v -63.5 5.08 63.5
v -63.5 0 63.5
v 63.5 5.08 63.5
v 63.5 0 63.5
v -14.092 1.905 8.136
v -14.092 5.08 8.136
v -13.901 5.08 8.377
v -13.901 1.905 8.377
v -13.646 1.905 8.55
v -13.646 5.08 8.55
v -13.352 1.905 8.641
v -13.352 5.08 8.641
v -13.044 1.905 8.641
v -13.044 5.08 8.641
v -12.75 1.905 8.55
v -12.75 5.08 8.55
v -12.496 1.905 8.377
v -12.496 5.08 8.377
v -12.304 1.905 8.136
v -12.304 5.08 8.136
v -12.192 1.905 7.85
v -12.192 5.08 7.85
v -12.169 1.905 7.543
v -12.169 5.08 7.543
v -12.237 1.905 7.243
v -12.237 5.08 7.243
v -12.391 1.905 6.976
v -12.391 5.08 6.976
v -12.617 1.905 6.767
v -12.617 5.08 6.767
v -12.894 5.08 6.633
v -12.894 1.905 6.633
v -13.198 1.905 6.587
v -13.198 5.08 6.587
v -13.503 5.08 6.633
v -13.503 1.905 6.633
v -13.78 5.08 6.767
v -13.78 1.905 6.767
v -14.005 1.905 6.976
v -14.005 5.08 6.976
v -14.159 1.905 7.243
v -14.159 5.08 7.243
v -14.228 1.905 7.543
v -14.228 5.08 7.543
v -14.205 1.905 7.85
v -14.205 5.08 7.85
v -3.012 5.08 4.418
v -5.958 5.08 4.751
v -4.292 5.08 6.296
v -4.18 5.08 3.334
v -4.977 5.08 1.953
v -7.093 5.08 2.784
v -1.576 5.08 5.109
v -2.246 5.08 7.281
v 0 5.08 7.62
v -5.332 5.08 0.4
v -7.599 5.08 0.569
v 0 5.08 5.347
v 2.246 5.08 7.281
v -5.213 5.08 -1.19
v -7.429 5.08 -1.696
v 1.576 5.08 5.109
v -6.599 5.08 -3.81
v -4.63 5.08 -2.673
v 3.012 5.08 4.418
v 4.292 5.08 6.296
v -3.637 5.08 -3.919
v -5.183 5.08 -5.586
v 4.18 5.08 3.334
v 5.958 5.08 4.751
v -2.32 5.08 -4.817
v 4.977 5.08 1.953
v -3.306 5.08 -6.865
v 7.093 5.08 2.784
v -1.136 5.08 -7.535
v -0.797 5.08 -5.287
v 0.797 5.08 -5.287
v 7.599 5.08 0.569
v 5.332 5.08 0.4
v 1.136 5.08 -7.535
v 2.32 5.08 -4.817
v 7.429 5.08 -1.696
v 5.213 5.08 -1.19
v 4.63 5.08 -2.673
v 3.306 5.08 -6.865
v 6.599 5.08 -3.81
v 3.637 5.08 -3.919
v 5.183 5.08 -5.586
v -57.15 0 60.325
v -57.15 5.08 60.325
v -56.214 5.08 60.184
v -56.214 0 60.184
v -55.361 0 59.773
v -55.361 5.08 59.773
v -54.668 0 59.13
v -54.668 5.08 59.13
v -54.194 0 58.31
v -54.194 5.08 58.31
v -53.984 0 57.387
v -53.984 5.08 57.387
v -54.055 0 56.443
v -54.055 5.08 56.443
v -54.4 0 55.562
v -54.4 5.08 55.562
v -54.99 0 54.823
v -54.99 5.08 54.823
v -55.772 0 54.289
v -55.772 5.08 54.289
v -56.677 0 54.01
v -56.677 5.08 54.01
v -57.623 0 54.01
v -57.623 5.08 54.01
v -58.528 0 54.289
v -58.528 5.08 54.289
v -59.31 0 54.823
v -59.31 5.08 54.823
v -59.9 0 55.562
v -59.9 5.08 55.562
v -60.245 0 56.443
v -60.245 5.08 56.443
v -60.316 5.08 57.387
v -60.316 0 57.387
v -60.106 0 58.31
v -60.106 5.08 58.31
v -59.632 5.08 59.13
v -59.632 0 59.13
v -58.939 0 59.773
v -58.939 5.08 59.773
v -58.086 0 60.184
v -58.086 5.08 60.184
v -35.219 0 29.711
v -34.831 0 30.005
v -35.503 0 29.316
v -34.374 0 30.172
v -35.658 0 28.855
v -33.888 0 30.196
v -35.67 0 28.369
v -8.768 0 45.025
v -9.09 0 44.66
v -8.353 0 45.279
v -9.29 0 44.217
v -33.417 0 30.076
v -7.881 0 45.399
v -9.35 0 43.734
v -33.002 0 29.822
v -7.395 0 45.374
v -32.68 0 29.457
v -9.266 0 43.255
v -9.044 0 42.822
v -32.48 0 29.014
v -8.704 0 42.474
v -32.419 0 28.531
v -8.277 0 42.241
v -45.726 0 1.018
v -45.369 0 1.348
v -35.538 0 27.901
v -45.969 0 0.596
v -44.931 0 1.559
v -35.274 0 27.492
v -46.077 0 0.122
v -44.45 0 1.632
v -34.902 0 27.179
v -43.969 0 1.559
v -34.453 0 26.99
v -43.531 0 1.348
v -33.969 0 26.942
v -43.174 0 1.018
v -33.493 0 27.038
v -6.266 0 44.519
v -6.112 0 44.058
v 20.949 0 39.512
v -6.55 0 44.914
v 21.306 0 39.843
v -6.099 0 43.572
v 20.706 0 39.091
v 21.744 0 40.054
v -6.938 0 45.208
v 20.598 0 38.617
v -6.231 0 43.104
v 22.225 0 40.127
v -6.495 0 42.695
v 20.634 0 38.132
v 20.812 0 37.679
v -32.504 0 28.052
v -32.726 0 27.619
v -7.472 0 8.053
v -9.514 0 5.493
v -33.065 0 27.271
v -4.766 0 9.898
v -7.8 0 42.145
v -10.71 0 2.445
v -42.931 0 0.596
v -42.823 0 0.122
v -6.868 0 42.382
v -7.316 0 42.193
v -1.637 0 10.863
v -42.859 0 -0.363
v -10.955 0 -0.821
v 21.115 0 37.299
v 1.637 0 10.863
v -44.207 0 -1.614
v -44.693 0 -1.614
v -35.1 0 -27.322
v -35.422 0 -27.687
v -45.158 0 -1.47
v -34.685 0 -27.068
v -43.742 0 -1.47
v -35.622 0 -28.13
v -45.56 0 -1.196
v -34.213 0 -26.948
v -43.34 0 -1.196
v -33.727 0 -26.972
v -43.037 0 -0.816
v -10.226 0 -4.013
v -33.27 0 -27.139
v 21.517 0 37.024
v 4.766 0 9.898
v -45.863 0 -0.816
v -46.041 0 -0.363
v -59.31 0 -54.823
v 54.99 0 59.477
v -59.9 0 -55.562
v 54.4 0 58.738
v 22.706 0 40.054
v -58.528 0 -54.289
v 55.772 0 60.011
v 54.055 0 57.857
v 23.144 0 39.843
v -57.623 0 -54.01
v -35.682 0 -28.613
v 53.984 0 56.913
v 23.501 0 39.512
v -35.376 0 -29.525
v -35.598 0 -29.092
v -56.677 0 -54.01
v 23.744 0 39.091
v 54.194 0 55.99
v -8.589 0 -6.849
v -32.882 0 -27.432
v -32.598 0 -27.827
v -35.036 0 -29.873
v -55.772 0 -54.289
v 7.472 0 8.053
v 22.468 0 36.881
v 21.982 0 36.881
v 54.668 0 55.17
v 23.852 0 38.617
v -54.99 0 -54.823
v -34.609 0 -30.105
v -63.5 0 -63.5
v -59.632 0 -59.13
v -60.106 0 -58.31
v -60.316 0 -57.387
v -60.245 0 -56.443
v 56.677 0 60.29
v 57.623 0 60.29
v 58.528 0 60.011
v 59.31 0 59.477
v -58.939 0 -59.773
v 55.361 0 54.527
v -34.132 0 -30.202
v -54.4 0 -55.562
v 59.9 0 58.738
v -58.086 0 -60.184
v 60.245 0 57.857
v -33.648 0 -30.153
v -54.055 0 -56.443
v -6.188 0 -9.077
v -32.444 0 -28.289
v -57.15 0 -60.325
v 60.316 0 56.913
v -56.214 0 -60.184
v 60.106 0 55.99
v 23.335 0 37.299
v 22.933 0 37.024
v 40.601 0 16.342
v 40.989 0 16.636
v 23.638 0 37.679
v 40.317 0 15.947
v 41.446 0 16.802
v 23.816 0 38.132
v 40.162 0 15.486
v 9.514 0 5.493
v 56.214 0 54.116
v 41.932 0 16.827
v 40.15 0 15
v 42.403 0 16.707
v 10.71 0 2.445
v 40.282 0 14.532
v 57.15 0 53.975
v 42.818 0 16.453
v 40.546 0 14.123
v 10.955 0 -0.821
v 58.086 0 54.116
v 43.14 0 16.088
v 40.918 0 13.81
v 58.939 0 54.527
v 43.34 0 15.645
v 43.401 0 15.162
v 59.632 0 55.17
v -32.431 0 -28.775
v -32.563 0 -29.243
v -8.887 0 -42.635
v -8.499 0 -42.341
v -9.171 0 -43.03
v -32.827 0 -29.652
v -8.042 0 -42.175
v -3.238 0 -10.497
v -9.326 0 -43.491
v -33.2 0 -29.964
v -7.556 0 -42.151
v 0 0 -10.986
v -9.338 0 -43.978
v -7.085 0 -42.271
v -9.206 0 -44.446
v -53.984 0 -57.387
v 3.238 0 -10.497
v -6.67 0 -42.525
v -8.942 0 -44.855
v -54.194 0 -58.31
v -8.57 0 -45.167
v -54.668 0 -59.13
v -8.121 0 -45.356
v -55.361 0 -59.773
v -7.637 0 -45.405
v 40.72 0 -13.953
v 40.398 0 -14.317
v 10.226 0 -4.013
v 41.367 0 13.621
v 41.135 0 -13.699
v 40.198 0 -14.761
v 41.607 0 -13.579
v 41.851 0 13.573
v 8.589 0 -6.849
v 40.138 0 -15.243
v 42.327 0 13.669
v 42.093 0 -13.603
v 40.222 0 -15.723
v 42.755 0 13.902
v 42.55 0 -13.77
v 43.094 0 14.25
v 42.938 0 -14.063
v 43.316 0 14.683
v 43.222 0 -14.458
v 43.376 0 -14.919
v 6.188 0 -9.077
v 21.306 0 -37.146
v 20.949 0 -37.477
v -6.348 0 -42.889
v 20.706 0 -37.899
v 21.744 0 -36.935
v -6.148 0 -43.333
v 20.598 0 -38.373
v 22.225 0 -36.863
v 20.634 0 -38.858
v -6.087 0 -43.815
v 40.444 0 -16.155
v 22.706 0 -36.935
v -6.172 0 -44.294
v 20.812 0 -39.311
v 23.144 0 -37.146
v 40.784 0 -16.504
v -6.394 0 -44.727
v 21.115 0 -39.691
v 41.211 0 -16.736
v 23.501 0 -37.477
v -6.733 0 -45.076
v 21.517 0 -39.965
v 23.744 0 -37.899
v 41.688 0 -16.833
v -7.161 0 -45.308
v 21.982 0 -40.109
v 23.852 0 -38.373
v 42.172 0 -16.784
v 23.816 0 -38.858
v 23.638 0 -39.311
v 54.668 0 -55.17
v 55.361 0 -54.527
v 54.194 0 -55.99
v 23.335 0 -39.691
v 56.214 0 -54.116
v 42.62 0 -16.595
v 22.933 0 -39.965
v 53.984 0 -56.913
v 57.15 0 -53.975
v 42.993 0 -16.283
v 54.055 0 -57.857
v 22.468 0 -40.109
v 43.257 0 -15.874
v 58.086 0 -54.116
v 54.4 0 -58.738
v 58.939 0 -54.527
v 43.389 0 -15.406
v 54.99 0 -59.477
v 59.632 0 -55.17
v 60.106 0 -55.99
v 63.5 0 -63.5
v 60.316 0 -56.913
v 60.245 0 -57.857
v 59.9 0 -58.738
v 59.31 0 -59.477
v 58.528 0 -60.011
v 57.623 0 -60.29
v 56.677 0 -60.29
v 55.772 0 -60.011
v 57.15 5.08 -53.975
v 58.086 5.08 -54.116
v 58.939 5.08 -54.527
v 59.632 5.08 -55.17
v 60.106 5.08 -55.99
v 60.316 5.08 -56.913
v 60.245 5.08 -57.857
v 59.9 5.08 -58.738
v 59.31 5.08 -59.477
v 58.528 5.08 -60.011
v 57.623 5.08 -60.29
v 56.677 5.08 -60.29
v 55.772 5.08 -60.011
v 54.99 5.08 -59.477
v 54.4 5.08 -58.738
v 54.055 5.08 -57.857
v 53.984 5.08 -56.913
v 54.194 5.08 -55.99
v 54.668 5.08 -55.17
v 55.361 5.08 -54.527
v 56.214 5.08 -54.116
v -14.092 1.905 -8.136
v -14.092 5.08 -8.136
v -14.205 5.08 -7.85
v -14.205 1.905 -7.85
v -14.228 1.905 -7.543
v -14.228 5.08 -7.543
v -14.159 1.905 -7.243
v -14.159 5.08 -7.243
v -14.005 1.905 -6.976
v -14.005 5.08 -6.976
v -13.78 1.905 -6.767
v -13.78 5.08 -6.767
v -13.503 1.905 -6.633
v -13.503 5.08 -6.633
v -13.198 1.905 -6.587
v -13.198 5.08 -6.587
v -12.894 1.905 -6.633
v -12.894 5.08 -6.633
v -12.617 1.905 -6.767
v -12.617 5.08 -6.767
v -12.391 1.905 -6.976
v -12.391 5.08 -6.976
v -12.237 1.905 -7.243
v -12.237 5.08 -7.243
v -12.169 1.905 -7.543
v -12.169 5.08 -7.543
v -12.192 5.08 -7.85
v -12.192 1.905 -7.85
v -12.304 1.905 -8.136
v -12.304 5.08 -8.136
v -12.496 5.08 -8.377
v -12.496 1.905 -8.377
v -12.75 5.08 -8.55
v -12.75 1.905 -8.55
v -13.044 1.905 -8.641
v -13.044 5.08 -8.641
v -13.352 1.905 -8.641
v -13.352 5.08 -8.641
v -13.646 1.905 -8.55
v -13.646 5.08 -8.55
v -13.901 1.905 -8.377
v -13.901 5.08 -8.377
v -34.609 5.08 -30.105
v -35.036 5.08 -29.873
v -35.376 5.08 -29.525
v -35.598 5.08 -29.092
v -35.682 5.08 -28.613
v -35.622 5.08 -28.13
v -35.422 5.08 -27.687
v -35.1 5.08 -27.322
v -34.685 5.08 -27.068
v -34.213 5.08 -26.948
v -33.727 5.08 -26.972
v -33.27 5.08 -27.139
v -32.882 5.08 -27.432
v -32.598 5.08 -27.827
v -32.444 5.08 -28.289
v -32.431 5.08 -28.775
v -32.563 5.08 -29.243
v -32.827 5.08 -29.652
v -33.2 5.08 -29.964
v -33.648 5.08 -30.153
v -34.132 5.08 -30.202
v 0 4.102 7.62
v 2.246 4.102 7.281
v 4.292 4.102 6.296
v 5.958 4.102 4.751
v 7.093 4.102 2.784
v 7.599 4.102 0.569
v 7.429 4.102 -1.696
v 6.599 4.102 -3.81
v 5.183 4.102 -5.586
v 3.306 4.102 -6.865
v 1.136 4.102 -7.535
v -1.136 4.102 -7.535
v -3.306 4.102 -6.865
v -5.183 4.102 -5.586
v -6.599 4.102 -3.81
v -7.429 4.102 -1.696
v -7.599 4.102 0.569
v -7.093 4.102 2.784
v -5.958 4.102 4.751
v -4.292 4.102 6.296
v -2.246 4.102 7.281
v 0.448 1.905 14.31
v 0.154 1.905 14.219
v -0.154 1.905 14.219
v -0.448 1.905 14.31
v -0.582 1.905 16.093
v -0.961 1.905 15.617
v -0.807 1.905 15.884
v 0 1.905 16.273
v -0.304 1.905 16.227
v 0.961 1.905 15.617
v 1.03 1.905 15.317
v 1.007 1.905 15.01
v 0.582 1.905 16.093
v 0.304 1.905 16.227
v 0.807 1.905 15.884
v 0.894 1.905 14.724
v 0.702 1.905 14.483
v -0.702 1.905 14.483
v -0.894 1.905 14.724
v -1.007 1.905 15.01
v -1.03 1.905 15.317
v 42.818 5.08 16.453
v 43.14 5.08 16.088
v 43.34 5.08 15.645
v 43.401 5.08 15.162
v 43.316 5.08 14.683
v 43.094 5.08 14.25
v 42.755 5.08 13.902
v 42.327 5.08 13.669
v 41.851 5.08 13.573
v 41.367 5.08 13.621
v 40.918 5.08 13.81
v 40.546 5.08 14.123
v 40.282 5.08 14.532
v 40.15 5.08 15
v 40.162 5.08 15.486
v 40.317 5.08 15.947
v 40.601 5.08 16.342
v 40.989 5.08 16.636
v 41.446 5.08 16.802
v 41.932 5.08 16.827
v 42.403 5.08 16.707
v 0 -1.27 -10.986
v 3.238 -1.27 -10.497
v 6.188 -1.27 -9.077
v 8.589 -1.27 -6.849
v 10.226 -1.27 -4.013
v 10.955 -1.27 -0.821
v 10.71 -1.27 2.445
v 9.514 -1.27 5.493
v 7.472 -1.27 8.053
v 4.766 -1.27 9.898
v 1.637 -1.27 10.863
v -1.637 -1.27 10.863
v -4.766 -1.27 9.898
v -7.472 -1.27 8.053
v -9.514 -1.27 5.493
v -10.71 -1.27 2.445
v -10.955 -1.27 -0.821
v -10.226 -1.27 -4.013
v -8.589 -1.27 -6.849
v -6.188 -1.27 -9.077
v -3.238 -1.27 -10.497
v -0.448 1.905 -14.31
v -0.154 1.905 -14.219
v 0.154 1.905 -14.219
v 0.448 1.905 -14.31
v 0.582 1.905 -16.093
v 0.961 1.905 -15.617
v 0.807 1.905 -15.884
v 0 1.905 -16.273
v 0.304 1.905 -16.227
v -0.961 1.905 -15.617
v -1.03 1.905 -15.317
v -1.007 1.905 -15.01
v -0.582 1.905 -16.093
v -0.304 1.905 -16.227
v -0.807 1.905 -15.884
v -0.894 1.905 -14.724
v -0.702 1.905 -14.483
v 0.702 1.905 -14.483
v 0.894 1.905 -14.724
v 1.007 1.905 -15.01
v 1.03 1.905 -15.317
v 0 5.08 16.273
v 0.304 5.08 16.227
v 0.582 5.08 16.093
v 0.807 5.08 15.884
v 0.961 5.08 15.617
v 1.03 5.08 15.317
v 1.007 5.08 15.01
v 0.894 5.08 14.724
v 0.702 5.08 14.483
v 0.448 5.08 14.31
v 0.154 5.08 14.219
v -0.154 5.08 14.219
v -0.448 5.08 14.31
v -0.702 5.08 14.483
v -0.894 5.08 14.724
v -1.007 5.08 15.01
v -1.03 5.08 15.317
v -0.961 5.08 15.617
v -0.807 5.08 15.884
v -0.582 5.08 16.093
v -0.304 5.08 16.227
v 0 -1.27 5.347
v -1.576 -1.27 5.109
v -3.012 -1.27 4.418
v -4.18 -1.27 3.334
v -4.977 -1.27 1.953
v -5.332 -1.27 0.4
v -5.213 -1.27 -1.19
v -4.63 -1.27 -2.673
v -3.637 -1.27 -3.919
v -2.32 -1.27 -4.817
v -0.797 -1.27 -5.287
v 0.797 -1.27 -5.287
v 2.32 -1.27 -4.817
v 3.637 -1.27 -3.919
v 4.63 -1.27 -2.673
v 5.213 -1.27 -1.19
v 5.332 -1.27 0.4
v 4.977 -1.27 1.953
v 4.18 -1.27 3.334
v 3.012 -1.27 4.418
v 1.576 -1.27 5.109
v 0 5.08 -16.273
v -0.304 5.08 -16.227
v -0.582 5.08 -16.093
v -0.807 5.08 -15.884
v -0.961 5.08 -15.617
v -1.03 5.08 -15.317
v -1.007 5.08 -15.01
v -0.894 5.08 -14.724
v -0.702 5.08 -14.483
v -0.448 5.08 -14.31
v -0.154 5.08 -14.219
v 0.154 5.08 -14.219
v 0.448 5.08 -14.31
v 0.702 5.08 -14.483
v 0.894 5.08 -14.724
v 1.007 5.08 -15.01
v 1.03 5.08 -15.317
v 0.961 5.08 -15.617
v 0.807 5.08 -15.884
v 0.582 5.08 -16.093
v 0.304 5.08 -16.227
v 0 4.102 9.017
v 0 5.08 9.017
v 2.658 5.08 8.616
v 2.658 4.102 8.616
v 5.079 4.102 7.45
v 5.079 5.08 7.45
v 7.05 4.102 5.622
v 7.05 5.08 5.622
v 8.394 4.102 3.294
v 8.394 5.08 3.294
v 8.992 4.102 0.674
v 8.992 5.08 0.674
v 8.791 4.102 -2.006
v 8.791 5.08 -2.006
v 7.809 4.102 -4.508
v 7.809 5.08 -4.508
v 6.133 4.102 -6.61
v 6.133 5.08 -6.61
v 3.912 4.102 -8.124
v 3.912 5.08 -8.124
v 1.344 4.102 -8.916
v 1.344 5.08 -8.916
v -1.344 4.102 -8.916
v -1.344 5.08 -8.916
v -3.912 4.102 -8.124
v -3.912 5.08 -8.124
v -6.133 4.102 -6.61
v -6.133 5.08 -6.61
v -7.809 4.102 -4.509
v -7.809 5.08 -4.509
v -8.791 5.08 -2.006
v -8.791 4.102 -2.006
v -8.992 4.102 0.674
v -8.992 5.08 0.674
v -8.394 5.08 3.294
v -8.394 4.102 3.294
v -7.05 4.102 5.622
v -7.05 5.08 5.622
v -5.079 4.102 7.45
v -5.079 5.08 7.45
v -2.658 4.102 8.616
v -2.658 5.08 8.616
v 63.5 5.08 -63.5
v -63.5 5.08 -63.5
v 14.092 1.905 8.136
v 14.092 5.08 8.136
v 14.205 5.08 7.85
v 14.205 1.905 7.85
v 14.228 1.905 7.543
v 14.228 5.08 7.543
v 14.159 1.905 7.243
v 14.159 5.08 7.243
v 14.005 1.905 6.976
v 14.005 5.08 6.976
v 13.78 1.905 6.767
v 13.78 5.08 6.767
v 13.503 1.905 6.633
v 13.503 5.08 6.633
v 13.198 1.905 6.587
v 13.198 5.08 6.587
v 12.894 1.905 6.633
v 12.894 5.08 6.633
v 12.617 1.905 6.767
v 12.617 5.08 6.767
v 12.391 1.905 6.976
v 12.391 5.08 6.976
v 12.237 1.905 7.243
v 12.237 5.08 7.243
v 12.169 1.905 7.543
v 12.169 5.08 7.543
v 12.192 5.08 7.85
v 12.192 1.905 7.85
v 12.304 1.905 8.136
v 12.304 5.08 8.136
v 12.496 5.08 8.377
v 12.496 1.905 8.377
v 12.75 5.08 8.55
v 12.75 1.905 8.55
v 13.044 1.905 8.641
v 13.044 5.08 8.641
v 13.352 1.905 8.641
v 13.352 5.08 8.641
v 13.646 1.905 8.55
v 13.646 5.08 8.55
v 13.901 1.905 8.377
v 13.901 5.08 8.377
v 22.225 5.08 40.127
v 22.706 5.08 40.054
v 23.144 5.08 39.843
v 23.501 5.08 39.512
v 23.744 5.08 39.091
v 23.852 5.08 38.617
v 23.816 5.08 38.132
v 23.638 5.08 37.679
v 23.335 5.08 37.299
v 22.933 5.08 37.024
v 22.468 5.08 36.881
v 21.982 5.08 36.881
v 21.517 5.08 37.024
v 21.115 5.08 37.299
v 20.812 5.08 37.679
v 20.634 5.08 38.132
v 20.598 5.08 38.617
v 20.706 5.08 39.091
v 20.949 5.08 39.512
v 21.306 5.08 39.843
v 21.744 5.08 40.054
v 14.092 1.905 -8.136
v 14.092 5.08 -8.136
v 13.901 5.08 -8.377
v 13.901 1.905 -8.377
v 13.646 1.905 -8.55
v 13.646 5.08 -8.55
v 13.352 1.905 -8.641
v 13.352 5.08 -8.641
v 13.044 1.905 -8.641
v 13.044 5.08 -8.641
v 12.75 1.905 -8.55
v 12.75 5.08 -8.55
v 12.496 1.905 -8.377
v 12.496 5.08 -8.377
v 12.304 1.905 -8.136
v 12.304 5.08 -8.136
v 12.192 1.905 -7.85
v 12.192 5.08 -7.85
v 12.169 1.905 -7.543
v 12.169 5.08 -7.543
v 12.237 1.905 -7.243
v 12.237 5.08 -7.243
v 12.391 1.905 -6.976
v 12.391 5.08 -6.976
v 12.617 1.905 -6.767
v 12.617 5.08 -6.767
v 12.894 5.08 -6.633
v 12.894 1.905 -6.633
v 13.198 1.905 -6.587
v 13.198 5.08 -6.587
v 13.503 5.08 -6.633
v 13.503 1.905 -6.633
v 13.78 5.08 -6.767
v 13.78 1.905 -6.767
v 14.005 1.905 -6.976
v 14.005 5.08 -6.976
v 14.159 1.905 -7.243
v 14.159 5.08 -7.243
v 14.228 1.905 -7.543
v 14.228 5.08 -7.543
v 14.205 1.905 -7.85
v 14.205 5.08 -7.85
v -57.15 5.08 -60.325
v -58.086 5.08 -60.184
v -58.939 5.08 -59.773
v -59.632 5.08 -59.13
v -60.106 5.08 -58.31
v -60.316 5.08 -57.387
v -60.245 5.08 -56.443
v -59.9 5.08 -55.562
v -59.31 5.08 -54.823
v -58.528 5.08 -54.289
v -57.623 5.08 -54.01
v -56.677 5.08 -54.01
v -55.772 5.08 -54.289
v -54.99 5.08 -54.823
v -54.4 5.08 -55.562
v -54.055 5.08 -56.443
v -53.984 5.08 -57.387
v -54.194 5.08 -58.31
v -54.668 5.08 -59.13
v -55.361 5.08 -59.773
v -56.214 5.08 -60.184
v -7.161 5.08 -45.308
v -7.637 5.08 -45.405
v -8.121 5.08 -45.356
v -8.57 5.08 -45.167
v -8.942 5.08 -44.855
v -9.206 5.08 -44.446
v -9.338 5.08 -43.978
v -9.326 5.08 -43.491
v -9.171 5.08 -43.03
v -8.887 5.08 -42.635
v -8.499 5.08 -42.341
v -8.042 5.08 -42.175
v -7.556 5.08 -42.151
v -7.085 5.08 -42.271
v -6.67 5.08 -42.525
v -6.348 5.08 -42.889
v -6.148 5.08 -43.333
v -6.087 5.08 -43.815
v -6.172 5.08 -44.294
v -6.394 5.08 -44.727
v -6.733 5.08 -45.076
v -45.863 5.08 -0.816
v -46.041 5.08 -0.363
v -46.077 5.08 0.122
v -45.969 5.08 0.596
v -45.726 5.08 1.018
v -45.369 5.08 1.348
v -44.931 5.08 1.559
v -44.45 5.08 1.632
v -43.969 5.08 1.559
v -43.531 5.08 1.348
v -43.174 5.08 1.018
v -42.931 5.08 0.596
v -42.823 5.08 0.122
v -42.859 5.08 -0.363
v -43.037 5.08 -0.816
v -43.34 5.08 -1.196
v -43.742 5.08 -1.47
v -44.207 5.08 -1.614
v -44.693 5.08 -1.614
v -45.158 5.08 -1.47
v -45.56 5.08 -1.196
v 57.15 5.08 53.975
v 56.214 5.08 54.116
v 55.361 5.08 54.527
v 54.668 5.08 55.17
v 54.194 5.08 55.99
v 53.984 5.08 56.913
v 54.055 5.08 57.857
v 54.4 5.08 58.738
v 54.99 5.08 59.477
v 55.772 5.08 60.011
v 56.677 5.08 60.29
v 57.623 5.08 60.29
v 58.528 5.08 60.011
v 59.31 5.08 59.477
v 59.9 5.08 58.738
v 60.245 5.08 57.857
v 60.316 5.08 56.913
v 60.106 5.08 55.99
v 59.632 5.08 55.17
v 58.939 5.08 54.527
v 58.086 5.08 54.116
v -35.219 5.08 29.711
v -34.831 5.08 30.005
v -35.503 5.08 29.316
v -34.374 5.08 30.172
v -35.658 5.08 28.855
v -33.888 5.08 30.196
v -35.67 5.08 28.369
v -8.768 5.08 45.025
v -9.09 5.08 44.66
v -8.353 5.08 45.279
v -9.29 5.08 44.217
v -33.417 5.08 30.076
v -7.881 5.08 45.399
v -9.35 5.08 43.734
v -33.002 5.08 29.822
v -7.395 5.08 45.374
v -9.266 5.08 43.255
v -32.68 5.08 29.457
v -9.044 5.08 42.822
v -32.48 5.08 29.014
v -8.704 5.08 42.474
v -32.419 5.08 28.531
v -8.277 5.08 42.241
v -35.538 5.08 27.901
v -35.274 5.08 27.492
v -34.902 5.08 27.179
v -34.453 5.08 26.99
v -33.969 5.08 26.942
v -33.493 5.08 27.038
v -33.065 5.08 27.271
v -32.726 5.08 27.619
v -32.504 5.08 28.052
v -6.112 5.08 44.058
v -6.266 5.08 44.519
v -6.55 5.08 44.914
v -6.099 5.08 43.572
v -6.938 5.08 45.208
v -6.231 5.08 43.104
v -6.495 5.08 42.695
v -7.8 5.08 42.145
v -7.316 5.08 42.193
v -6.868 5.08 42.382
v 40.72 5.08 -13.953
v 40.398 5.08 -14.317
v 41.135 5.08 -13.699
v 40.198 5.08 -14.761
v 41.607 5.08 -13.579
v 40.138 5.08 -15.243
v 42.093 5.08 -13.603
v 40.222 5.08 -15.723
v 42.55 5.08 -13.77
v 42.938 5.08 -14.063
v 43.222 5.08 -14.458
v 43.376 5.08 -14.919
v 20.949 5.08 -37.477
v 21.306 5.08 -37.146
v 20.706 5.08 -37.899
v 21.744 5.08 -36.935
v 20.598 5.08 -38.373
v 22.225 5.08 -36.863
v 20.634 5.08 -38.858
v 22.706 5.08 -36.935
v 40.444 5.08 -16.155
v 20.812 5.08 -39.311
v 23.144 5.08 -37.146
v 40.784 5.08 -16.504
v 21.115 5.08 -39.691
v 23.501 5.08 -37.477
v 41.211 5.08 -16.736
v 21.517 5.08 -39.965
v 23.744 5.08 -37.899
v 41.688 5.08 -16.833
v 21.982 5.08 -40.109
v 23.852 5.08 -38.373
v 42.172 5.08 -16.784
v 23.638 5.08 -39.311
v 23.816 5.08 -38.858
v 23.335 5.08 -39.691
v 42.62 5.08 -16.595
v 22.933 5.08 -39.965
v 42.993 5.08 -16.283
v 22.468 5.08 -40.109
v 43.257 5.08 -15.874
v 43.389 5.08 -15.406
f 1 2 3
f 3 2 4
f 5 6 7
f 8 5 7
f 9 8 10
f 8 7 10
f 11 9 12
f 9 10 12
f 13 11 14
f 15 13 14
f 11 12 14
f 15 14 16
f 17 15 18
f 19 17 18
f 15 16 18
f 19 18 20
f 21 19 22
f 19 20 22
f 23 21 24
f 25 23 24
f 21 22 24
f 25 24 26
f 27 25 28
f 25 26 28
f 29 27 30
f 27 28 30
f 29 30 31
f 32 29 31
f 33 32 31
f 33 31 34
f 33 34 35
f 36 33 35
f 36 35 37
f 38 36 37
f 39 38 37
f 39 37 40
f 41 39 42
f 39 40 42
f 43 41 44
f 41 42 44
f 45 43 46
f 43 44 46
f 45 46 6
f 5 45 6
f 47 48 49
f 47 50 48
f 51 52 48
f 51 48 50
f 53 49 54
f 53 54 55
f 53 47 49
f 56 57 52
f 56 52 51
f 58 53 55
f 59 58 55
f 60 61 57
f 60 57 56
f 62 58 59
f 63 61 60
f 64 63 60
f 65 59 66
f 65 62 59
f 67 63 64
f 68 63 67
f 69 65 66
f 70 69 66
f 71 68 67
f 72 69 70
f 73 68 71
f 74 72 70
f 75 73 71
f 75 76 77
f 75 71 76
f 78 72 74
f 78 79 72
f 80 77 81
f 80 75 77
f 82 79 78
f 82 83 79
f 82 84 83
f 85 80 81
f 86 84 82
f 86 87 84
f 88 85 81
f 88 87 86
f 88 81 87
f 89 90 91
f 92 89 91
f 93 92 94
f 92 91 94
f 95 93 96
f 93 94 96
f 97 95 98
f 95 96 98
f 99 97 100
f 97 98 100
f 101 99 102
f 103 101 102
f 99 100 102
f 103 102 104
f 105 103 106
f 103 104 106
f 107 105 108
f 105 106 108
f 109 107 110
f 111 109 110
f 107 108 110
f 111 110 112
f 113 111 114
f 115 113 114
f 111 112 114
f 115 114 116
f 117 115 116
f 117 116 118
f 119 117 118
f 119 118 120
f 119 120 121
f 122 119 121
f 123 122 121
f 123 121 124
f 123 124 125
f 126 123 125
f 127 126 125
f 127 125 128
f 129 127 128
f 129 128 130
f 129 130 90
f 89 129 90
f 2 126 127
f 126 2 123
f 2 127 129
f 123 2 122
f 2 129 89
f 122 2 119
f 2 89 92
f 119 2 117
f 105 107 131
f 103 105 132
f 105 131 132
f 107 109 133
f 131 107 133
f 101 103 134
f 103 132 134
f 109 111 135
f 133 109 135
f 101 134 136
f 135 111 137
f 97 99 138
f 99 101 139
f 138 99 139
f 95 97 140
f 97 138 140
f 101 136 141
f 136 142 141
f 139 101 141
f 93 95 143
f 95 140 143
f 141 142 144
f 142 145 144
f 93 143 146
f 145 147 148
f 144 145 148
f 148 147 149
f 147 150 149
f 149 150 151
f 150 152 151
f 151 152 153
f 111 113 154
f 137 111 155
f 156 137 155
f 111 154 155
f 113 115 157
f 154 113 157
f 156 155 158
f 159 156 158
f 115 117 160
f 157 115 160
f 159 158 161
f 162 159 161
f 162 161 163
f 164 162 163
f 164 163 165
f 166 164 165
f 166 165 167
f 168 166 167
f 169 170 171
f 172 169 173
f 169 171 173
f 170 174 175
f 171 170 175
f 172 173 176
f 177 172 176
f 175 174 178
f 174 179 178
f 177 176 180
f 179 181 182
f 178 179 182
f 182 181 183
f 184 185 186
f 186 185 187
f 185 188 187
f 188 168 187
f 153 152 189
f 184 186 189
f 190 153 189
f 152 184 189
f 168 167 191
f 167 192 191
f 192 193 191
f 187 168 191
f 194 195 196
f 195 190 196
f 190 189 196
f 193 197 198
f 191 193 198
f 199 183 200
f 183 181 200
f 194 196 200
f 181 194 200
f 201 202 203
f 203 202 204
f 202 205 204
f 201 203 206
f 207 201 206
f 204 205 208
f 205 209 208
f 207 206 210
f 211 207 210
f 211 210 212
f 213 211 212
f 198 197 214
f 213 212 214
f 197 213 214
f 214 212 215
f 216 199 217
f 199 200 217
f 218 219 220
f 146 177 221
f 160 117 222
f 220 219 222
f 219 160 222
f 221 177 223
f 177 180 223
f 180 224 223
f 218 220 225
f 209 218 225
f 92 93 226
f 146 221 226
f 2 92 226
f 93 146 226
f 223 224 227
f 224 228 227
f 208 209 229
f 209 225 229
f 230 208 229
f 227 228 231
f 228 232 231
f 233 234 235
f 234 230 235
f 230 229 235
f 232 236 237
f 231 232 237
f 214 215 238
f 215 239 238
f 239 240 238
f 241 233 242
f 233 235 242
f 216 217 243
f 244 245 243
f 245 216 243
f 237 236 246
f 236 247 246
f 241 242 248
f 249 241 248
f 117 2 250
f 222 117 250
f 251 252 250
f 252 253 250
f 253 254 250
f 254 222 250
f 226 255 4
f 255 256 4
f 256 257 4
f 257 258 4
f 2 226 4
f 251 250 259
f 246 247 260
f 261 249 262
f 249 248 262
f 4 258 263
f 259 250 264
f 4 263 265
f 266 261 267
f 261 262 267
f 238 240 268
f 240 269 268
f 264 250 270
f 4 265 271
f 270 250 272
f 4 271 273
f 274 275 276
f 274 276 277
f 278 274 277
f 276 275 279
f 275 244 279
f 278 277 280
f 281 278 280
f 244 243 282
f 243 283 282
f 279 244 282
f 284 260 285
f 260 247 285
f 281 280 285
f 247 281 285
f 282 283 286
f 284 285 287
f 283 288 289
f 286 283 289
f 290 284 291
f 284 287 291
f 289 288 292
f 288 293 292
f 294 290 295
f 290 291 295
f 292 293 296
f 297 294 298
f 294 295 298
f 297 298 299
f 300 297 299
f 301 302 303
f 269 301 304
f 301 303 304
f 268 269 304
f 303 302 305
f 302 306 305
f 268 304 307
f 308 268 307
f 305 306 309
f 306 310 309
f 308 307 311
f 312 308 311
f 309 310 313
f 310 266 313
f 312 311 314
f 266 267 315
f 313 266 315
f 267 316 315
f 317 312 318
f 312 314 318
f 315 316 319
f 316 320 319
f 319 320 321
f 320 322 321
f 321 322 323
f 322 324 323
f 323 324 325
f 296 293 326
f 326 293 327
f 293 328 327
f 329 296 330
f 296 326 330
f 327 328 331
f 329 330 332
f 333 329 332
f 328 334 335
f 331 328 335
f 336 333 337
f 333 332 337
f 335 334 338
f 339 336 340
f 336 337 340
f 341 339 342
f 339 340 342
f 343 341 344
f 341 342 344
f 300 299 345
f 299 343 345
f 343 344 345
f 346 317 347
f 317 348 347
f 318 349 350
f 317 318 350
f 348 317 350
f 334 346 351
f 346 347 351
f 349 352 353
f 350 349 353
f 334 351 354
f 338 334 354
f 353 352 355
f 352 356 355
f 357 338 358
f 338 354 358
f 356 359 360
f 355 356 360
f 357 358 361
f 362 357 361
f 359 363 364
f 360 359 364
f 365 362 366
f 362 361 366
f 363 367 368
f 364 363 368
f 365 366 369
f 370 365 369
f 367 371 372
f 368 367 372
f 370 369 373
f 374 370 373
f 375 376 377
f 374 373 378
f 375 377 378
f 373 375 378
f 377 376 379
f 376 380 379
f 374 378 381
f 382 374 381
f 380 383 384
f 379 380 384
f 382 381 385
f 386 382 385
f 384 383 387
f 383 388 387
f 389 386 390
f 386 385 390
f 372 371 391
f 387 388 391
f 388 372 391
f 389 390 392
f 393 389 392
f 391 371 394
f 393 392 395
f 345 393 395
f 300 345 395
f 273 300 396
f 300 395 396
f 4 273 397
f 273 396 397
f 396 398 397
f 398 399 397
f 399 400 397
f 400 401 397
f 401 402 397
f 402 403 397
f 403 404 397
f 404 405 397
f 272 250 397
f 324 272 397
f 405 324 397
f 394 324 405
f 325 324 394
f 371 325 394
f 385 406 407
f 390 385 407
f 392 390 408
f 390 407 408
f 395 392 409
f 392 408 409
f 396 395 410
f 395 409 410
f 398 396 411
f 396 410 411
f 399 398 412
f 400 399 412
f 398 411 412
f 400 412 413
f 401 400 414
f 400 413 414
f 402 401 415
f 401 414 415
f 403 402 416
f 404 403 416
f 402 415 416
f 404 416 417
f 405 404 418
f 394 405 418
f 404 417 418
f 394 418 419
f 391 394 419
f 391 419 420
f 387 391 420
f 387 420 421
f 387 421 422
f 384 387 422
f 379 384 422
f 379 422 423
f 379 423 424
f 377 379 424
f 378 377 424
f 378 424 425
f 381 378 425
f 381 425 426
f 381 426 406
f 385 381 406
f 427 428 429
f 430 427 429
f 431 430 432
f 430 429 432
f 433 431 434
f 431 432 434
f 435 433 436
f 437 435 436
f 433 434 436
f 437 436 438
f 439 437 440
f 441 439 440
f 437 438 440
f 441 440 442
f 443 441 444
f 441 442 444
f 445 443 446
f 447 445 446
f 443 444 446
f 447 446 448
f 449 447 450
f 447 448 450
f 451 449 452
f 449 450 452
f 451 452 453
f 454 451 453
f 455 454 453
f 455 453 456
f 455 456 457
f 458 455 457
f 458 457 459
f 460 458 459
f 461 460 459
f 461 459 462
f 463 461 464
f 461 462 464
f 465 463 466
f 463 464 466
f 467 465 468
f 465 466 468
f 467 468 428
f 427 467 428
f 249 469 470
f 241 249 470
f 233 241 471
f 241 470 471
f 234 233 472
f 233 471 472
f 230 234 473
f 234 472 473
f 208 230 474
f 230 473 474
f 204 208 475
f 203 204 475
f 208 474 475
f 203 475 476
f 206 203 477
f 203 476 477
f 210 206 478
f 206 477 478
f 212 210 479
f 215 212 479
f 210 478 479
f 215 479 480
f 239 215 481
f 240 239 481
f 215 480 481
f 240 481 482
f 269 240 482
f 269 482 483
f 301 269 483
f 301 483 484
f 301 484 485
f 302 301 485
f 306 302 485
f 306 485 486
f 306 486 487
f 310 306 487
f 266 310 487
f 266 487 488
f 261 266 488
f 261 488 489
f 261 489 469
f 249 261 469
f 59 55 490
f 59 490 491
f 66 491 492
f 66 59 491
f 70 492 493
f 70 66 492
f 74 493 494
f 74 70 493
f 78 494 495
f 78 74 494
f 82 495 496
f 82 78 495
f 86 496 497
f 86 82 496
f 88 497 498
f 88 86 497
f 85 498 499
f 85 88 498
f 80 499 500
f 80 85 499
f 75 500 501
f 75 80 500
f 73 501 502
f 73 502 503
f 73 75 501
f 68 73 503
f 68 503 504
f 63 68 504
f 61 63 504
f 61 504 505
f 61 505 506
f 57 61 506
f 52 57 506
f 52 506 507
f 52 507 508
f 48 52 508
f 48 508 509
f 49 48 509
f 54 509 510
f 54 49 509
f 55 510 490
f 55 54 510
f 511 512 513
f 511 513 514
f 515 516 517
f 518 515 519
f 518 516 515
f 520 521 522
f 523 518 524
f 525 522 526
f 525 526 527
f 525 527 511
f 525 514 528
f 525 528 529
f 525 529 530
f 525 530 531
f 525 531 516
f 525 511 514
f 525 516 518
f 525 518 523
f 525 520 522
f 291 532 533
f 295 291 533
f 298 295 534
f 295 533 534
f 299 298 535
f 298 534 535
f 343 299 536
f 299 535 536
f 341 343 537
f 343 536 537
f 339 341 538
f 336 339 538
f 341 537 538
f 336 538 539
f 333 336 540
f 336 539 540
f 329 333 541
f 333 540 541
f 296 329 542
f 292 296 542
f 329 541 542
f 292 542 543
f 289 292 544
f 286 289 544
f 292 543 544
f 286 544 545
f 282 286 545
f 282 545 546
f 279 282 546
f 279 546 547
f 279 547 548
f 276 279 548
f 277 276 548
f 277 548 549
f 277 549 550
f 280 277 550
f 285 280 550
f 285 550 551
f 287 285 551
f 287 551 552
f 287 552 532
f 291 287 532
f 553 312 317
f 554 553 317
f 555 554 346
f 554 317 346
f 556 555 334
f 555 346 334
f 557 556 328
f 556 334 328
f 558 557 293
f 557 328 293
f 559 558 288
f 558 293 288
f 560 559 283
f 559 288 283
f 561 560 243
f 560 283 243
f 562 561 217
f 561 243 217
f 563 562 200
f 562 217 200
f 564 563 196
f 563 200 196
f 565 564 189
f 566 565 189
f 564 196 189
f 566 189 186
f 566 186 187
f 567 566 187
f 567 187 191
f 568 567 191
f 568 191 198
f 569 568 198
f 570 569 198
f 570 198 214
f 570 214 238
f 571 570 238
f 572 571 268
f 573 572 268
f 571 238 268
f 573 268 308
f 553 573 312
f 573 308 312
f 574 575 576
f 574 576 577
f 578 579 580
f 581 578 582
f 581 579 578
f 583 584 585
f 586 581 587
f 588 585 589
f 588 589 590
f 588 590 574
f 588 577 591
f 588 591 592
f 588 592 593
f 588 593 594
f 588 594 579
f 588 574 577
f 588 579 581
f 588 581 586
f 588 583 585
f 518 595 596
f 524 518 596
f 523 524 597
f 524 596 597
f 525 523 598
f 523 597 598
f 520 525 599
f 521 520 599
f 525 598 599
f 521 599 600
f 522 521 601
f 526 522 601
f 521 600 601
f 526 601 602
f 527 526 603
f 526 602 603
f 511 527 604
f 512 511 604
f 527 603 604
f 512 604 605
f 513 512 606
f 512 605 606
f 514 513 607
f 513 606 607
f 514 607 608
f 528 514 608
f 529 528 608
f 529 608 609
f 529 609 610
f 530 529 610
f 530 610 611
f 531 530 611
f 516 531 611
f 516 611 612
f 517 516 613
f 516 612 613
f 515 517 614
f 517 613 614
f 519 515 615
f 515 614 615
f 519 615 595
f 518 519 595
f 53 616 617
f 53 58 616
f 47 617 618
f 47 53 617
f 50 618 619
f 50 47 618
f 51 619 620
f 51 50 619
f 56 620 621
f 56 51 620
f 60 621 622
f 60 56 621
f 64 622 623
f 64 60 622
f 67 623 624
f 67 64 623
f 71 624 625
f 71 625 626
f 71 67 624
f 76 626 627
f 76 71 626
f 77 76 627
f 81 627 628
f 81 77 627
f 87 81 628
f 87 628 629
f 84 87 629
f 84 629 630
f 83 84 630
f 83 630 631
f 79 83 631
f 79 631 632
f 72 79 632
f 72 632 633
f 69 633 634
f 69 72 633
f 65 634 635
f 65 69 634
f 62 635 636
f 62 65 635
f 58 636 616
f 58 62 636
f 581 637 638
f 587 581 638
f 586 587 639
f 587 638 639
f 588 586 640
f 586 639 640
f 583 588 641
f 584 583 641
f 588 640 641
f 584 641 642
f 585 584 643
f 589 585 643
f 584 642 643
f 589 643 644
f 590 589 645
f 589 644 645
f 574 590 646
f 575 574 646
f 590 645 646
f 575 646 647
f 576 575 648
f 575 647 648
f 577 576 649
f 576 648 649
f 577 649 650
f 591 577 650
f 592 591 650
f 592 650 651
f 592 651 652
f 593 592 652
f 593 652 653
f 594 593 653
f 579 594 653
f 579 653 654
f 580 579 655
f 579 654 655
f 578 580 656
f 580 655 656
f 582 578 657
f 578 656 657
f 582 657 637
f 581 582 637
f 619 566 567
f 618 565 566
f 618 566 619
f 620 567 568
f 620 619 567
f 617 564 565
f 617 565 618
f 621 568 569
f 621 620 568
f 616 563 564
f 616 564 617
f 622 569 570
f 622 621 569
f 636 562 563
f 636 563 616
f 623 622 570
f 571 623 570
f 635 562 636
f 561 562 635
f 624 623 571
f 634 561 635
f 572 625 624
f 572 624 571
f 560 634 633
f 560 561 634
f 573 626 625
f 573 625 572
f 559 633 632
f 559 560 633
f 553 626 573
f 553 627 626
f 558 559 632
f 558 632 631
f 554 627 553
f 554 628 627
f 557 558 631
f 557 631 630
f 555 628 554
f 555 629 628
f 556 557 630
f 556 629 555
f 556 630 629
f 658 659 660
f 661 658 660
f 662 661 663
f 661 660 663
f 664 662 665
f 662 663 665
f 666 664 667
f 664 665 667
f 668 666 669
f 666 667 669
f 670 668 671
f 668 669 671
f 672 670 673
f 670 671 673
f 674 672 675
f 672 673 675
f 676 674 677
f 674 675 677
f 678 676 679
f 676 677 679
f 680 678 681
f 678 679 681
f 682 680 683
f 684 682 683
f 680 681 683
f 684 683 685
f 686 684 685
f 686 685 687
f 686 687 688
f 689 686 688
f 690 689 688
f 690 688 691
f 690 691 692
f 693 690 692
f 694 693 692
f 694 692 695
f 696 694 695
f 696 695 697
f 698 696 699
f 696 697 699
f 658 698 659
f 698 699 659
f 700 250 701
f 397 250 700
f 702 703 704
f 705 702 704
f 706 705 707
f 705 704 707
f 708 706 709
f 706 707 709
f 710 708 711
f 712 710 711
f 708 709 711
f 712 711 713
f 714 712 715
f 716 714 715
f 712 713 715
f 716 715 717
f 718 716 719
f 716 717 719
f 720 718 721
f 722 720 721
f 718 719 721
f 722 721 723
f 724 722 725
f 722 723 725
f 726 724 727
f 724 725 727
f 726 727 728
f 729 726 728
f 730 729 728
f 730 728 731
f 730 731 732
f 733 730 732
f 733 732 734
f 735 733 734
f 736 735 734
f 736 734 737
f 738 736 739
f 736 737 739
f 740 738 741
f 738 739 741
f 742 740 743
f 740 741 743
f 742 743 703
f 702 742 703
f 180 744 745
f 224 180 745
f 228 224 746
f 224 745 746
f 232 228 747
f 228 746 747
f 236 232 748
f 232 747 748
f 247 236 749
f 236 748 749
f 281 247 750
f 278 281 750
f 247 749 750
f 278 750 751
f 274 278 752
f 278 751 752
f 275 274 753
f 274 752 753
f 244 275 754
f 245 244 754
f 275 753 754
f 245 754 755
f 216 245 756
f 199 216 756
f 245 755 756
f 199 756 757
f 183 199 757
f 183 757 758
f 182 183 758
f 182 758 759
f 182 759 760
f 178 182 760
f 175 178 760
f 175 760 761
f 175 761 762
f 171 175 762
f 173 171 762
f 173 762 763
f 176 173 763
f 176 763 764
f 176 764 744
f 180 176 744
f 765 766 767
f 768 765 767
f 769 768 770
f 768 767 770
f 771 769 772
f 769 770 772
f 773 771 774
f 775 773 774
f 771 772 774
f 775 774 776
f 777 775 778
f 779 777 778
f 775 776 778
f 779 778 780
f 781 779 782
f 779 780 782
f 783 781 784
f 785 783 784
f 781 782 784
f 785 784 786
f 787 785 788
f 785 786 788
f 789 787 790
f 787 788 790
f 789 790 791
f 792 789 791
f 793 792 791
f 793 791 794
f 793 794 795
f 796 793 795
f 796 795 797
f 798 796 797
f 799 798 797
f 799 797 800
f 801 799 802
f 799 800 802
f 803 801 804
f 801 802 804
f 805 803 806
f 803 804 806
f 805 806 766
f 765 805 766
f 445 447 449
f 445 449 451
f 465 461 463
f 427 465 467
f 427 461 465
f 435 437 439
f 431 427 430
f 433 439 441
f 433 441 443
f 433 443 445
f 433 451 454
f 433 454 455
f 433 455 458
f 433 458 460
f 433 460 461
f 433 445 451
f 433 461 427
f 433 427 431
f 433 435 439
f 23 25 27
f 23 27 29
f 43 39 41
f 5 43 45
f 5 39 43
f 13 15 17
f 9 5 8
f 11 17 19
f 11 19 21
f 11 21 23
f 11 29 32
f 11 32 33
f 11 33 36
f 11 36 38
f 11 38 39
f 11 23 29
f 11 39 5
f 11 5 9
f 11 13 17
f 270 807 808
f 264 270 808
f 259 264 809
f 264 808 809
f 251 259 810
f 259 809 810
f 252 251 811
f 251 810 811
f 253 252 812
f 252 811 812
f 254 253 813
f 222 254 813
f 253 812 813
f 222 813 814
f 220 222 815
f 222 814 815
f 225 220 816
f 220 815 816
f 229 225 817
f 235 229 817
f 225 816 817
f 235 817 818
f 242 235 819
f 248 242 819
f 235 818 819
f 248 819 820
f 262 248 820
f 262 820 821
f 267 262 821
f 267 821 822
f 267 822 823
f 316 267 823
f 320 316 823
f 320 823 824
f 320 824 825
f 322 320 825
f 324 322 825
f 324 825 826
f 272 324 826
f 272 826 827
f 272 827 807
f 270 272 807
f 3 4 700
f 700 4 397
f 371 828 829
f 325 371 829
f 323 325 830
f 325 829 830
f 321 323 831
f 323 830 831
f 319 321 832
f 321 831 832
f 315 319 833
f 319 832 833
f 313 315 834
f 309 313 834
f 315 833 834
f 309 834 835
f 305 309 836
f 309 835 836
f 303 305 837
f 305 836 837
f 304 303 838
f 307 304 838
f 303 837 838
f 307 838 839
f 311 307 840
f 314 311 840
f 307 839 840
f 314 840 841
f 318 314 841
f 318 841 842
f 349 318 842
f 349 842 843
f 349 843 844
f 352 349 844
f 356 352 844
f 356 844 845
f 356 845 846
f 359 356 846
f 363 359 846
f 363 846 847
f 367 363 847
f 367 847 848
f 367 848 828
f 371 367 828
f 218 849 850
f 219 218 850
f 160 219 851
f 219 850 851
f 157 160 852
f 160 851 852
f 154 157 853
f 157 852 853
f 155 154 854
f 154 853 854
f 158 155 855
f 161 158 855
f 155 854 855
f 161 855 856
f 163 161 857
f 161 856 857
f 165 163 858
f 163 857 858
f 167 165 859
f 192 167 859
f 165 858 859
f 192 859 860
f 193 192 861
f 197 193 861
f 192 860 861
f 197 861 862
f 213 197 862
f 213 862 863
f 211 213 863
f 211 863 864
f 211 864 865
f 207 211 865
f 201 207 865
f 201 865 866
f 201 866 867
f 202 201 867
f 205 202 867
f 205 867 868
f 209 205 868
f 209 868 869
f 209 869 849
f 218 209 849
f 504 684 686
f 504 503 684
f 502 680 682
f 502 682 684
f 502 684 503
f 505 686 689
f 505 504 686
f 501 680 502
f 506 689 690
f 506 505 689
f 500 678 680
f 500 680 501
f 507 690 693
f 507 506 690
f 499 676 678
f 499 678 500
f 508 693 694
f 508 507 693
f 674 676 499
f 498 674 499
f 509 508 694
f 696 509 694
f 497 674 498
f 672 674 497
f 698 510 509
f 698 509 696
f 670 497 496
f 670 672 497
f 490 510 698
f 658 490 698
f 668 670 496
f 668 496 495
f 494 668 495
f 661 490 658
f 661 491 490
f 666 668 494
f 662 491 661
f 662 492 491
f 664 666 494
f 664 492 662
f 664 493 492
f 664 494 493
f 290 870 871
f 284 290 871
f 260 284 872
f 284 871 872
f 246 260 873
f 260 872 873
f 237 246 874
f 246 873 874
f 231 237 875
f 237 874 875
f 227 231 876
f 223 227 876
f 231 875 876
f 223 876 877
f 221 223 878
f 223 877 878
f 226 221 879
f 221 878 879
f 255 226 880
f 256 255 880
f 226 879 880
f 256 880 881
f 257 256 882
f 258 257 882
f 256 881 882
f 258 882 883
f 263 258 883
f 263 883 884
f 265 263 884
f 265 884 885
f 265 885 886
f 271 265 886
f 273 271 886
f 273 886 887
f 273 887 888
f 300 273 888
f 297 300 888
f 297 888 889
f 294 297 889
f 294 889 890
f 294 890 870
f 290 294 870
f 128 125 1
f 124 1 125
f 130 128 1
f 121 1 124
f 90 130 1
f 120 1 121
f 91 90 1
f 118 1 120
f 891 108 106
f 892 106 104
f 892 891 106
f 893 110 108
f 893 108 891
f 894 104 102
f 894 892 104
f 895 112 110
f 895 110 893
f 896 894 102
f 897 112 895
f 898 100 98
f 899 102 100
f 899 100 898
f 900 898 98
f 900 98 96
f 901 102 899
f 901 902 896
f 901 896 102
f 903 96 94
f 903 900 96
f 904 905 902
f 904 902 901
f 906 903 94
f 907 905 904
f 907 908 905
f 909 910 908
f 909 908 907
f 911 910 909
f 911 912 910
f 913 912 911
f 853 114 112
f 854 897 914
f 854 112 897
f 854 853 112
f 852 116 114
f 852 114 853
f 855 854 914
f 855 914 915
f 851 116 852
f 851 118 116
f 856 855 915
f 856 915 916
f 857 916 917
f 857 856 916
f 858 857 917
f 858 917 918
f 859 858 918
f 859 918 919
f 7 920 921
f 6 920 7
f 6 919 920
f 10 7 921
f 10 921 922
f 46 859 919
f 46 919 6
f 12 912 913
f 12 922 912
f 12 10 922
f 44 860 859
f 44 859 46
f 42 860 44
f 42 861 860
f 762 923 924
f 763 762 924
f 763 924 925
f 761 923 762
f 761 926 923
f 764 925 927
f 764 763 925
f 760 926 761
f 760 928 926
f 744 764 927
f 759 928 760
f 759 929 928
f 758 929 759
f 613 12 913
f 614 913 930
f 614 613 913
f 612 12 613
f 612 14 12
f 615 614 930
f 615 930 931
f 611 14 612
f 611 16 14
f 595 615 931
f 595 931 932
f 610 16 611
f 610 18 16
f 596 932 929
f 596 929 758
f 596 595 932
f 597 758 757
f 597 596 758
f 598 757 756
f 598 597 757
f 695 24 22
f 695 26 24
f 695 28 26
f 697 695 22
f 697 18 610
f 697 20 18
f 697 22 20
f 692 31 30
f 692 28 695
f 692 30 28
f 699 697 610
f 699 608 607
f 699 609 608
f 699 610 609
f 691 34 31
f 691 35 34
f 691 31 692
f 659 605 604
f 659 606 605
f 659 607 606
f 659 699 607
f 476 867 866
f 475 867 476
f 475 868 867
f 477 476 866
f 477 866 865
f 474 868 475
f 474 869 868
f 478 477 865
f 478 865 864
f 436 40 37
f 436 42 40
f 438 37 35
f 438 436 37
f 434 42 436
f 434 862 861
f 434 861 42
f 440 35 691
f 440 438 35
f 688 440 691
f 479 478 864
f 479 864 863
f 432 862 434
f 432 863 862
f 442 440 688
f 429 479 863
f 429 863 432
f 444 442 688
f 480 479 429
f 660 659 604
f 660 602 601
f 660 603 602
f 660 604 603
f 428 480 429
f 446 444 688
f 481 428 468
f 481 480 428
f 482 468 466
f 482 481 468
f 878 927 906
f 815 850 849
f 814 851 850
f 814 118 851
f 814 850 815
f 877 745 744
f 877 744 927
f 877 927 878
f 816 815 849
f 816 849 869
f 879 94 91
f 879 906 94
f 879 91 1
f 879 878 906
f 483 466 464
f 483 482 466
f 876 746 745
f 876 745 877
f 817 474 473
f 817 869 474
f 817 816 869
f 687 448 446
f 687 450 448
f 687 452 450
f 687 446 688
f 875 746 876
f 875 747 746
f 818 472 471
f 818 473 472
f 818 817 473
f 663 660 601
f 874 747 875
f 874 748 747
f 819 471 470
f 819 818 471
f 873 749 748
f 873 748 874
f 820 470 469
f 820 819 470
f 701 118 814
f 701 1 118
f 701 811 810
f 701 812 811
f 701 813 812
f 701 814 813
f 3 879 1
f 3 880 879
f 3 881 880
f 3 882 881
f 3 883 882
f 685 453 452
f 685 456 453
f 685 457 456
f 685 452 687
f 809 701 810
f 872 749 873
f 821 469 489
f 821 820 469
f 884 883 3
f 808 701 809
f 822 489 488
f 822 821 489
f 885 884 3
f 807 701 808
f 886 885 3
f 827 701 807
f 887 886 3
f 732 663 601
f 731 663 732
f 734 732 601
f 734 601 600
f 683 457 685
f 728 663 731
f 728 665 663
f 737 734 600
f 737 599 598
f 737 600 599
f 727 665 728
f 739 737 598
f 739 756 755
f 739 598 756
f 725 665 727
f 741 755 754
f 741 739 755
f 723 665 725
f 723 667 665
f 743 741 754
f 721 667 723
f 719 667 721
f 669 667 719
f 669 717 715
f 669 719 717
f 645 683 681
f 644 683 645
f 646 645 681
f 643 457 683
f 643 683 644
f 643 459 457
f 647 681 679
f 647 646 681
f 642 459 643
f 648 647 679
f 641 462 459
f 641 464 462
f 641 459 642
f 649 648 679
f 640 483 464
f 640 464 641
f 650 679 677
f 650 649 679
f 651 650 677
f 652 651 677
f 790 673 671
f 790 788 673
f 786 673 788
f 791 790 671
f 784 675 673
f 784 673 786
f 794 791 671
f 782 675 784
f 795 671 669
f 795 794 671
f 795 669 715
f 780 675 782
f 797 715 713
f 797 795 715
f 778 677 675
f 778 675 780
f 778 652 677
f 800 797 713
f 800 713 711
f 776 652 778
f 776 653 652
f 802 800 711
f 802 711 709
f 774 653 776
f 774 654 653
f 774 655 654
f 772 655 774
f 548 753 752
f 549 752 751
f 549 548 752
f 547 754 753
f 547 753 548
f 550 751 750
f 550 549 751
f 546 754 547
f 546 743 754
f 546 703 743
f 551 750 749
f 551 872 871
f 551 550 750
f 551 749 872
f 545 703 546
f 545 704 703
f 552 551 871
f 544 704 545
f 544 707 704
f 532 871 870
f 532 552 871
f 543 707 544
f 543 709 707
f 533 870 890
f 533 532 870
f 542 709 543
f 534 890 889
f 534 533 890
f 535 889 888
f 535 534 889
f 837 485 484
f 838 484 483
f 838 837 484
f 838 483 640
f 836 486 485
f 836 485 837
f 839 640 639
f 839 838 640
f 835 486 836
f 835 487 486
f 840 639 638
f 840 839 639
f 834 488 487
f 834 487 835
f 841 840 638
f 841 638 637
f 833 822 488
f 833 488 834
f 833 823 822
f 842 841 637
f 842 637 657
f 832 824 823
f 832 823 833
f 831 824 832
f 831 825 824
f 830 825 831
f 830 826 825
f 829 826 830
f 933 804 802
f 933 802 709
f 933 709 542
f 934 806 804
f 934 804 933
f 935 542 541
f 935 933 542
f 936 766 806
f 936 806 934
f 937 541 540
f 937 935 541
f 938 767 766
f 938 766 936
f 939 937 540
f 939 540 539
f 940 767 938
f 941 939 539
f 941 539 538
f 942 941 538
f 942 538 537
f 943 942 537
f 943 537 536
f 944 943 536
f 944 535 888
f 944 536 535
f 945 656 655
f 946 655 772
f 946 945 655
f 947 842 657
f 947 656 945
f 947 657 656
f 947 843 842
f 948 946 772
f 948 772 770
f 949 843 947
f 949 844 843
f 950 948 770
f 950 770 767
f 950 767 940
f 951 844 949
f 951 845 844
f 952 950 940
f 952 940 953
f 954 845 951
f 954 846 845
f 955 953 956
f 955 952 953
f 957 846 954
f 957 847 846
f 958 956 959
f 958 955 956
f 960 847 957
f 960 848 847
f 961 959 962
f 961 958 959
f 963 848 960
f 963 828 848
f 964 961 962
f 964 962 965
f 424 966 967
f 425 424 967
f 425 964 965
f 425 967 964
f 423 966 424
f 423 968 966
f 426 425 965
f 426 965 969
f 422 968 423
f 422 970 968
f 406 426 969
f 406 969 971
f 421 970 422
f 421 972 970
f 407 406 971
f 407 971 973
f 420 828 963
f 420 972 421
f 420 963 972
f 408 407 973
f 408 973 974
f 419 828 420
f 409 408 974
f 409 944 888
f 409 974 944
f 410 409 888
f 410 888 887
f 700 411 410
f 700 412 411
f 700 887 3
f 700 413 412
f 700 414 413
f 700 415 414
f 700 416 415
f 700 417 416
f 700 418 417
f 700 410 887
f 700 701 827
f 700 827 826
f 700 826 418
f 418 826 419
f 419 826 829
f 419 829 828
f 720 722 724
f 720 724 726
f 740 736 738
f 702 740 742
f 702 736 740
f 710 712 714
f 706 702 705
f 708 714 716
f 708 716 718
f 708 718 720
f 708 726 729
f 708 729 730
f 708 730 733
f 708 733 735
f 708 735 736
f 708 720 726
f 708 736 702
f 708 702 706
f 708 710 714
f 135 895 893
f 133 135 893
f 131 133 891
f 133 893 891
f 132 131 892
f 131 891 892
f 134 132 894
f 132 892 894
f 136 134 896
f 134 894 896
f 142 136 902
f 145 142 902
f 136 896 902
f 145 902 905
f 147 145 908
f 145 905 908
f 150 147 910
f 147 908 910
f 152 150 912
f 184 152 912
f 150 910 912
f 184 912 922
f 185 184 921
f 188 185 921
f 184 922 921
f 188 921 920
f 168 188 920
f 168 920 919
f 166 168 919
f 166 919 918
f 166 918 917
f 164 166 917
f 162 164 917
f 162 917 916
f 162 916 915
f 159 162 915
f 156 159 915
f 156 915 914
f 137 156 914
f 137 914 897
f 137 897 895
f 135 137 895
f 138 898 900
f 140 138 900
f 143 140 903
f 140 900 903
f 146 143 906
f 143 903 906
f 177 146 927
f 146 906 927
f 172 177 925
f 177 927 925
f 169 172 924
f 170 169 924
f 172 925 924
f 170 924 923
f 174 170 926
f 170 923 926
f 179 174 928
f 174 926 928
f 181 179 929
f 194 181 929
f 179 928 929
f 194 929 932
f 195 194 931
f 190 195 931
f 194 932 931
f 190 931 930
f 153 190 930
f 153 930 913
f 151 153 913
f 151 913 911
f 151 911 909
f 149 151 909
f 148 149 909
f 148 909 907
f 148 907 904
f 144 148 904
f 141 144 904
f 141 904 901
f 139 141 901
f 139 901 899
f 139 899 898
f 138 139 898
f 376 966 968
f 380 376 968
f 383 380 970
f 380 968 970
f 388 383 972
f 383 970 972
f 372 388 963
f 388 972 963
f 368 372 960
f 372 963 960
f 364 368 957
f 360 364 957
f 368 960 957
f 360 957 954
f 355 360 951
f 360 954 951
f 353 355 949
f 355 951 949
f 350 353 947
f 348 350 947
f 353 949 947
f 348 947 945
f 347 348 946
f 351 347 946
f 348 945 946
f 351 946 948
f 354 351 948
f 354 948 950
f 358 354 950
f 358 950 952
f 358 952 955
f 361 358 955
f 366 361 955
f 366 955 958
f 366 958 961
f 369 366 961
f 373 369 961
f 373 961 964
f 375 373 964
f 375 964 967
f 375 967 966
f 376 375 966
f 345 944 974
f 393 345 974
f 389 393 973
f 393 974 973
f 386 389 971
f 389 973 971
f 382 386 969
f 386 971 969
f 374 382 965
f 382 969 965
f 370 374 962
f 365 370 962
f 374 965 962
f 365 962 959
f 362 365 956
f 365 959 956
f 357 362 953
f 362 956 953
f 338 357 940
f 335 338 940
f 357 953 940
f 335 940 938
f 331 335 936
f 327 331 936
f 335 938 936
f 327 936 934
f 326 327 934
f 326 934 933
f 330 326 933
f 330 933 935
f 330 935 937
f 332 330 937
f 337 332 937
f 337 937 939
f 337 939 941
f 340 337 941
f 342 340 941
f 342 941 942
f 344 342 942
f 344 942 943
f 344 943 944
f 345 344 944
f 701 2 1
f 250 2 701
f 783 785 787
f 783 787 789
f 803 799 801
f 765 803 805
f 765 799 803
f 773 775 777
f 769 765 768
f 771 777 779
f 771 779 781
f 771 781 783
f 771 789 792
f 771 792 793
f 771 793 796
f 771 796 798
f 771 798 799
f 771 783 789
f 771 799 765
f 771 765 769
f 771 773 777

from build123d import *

# Parameters (mm, degrees)
SKETCH1_W           = 127
SKETCH1_H           = 127
BOSS_EXTRUDE1_DEPTH = 5.08
CUT_EXTRUDE1_REACH  = 91.946
SKETCH2_R           = 5.3467
SKETCH4_R           = 9.017
SKETCH4_R_2         = 7.62
CUT_EXTRUDE3_DEPTH  = 0.9779
SKETCH5_R           = 1.03251
CUT_EXTRUDE4_DEPTH  = 3.175
CIRPATTERN1_COUNT   = 6
CUT_EXTRUDE5_REACH  = 91.946
SKETCH6_R           = 1.63195
CIRPATTERN2_COUNT   = 9
CUT_EXTRUDE6_REACH  = 91.946
SKETCH7_R           = 3.175
SKETCH9_R           = 10.9855
SKETCH9_R_2         = 5.3467
BOSS_EXTRUDE2_DEPTH = 1.27


with BuildPart() as part:
    # Sketch1 → Boss-Extrude1 (new body)
    with BuildSketch(Plane(origin=(0, 0, 0), x_dir=(1, 0, 0), z_dir=(0, 1, 0))):
        Rectangle(SKETCH1_W, SKETCH1_H)
    extrude(amount=BOSS_EXTRUDE1_DEPTH)

    # Sketch2 → Cut-Extrude1 (cut, up to next)
    with BuildSketch(Plane(origin=(0, 5.08, 0), x_dir=(1, 0, 0), z_dir=(0, 1, 0)), mode=Mode.PRIVATE) as cut_extrude1_sk1:
        with Locations(Location((0, 0, 0), (0, 0, 270))):
            Circle(SKETCH2_R)
    cut_extrude1_tool1 = extrude(cut_extrude1_sk1.sketch, amount=-CUT_EXTRUDE1_REACH, mode=Mode.PRIVATE) & part.part
    add(cut_extrude1_tool1.solids().sort_by_distance((0, 5.08, 0))[0], mode=Mode.SUBTRACT)

    # Sketch4 → Cut-Extrude3 (cut)
    with BuildSketch(Plane(origin=(0, 5.08, 0), x_dir=(1, 0, 0), z_dir=(0, 1, 0))):
        with Locations(Location((0, 0, 0), (0, 0, 270))):
            Circle(SKETCH4_R)
        with Locations(Location((0, 0, 0), (0, 0, 270))):
            Circle(SKETCH4_R_2, mode=Mode.SUBTRACT)
    extrude(amount=-CUT_EXTRUDE3_DEPTH, mode=Mode.SUBTRACT)

    # Sketch5 → Cut-Extrude4 (cut)
    with BuildSketch(Plane(origin=(0, 5.08, 0), x_dir=(1, 0, 0), z_dir=(0, 1, 0))):
        with Locations(Location((0, -15.24, 0), (0, 0, 270))):
            Circle(SKETCH5_R)
    cut_extrude4 = extrude(amount=-CUT_EXTRUDE4_DEPTH, mode=Mode.SUBTRACT)

    # CirPattern1: Cut-Extrude4 ×6 about axis
    cirpattern1_axis = Axis((0, 0, 0), (0, 1, 0))
    for i in range(1, CIRPATTERN1_COUNT):
        add(cut_extrude4.rotate(cirpattern1_axis, i * 360 / CIRPATTERN1_COUNT), mode=Mode.SUBTRACT)

    # Sketch6 → Cut-Extrude5 (cut, up to next)
    with BuildSketch(Plane(origin=(0, 5.08, 0), x_dir=(1, 0, 0), z_dir=(0, 1, 0)), mode=Mode.PRIVATE) as cut_extrude5_sk1:
        with Locations(Location((22.225, -38.494829198, 0), (0, 0, 270))):
            Circle(SKETCH6_R)
    cut_extrude5_tool1 = extrude(cut_extrude5_sk1.sketch, amount=-CUT_EXTRUDE5_REACH, mode=Mode.PRIVATE) & part.part
    cut_extrude5 = cut_extrude5_tool1.solids().sort_by_distance((22.225, 5.08, 38.494829))[0]
    add(cut_extrude5, mode=Mode.SUBTRACT)

    # CirPattern2: Cut-Extrude5 ×9 about axis
    cirpattern2_axis = Axis((0, 0, 0), (0, 1, 0))
    for i in range(1, CIRPATTERN2_COUNT):
        add(cut_extrude5.rotate(cirpattern2_axis, i * 360 / CIRPATTERN2_COUNT), mode=Mode.SUBTRACT)

    # Sketch7 → Cut-Extrude6 (cut, up to next)
    with BuildSketch(Plane(origin=(0, 5.08, 0), x_dir=(1, 0, 0), z_dir=(0, 1, 0)), mode=Mode.PRIVATE) as cut_extrude6_sk1:
        with Locations(Location((57.15, 57.15, 0), (0, 0, 270))):
            Circle(SKETCH7_R)
    cut_extrude6_tool1 = extrude(cut_extrude6_sk1.sketch, amount=-CUT_EXTRUDE6_REACH, mode=Mode.PRIVATE) & part.part
    # Sketch7 → Cut-Extrude6 (cut, up to next)
    with BuildSketch(Plane(origin=(0, 5.08, 0), x_dir=(1, 0, 0), z_dir=(0, 1, 0)), mode=Mode.PRIVATE) as cut_extrude6_sk2:
        with Locations(Location((57.15, -57.15, 0), (0, 0, 90))):
            Circle(SKETCH7_R)
    cut_extrude6_tool2 = extrude(cut_extrude6_sk2.sketch, amount=-CUT_EXTRUDE6_REACH, mode=Mode.PRIVATE) & part.part
    # Sketch7 → Cut-Extrude6 (cut, up to next)
    with BuildSketch(Plane(origin=(0, 5.08, 0), x_dir=(1, 0, 0), z_dir=(0, 1, 0)), mode=Mode.PRIVATE) as cut_extrude6_sk3:
        with Locations(Location((-57.15, -57.15, 0), (0, 0, 270))):
            Circle(SKETCH7_R)
    cut_extrude6_tool3 = extrude(cut_extrude6_sk3.sketch, amount=-CUT_EXTRUDE6_REACH, mode=Mode.PRIVATE) & part.part
    # Sketch7 → Cut-Extrude6 (cut, up to next)
    with BuildSketch(Plane(origin=(0, 5.08, 0), x_dir=(1, 0, 0), z_dir=(0, 1, 0)), mode=Mode.PRIVATE) as cut_extrude6_sk4:
        with Locations(Location((-57.15, 57.15, 0), (0, 0, 90))):
            Circle(SKETCH7_R)
    cut_extrude6_tool4 = extrude(cut_extrude6_sk4.sketch, amount=-CUT_EXTRUDE6_REACH, mode=Mode.PRIVATE) & part.part
    add(cut_extrude6_tool1.solids().sort_by_distance((57.15, 5.08, -57.15))[0], mode=Mode.SUBTRACT)
    add(cut_extrude6_tool2.solids().sort_by_distance((57.15, 5.08, 57.15))[0], mode=Mode.SUBTRACT)
    add(cut_extrude6_tool3.solids().sort_by_distance((-57.15, 5.08, 57.15))[0], mode=Mode.SUBTRACT)
    add(cut_extrude6_tool4.solids().sort_by_distance((-57.15, 5.08, -57.15))[0], mode=Mode.SUBTRACT)

    # Sketch9 → Boss-Extrude2 (add)
    with BuildSketch(Plane.XZ):
        with Locations(Location((0, 0, 0), (0, 0, 270))):
            Circle(SKETCH9_R)
        with Locations(Location((0, 0, 0), (0, 0, 90))):
            Circle(SKETCH9_R_2, mode=Mode.SUBTRACT)
    extrude(amount=BOSS_EXTRUDE2_DEPTH)


solid = part.part
